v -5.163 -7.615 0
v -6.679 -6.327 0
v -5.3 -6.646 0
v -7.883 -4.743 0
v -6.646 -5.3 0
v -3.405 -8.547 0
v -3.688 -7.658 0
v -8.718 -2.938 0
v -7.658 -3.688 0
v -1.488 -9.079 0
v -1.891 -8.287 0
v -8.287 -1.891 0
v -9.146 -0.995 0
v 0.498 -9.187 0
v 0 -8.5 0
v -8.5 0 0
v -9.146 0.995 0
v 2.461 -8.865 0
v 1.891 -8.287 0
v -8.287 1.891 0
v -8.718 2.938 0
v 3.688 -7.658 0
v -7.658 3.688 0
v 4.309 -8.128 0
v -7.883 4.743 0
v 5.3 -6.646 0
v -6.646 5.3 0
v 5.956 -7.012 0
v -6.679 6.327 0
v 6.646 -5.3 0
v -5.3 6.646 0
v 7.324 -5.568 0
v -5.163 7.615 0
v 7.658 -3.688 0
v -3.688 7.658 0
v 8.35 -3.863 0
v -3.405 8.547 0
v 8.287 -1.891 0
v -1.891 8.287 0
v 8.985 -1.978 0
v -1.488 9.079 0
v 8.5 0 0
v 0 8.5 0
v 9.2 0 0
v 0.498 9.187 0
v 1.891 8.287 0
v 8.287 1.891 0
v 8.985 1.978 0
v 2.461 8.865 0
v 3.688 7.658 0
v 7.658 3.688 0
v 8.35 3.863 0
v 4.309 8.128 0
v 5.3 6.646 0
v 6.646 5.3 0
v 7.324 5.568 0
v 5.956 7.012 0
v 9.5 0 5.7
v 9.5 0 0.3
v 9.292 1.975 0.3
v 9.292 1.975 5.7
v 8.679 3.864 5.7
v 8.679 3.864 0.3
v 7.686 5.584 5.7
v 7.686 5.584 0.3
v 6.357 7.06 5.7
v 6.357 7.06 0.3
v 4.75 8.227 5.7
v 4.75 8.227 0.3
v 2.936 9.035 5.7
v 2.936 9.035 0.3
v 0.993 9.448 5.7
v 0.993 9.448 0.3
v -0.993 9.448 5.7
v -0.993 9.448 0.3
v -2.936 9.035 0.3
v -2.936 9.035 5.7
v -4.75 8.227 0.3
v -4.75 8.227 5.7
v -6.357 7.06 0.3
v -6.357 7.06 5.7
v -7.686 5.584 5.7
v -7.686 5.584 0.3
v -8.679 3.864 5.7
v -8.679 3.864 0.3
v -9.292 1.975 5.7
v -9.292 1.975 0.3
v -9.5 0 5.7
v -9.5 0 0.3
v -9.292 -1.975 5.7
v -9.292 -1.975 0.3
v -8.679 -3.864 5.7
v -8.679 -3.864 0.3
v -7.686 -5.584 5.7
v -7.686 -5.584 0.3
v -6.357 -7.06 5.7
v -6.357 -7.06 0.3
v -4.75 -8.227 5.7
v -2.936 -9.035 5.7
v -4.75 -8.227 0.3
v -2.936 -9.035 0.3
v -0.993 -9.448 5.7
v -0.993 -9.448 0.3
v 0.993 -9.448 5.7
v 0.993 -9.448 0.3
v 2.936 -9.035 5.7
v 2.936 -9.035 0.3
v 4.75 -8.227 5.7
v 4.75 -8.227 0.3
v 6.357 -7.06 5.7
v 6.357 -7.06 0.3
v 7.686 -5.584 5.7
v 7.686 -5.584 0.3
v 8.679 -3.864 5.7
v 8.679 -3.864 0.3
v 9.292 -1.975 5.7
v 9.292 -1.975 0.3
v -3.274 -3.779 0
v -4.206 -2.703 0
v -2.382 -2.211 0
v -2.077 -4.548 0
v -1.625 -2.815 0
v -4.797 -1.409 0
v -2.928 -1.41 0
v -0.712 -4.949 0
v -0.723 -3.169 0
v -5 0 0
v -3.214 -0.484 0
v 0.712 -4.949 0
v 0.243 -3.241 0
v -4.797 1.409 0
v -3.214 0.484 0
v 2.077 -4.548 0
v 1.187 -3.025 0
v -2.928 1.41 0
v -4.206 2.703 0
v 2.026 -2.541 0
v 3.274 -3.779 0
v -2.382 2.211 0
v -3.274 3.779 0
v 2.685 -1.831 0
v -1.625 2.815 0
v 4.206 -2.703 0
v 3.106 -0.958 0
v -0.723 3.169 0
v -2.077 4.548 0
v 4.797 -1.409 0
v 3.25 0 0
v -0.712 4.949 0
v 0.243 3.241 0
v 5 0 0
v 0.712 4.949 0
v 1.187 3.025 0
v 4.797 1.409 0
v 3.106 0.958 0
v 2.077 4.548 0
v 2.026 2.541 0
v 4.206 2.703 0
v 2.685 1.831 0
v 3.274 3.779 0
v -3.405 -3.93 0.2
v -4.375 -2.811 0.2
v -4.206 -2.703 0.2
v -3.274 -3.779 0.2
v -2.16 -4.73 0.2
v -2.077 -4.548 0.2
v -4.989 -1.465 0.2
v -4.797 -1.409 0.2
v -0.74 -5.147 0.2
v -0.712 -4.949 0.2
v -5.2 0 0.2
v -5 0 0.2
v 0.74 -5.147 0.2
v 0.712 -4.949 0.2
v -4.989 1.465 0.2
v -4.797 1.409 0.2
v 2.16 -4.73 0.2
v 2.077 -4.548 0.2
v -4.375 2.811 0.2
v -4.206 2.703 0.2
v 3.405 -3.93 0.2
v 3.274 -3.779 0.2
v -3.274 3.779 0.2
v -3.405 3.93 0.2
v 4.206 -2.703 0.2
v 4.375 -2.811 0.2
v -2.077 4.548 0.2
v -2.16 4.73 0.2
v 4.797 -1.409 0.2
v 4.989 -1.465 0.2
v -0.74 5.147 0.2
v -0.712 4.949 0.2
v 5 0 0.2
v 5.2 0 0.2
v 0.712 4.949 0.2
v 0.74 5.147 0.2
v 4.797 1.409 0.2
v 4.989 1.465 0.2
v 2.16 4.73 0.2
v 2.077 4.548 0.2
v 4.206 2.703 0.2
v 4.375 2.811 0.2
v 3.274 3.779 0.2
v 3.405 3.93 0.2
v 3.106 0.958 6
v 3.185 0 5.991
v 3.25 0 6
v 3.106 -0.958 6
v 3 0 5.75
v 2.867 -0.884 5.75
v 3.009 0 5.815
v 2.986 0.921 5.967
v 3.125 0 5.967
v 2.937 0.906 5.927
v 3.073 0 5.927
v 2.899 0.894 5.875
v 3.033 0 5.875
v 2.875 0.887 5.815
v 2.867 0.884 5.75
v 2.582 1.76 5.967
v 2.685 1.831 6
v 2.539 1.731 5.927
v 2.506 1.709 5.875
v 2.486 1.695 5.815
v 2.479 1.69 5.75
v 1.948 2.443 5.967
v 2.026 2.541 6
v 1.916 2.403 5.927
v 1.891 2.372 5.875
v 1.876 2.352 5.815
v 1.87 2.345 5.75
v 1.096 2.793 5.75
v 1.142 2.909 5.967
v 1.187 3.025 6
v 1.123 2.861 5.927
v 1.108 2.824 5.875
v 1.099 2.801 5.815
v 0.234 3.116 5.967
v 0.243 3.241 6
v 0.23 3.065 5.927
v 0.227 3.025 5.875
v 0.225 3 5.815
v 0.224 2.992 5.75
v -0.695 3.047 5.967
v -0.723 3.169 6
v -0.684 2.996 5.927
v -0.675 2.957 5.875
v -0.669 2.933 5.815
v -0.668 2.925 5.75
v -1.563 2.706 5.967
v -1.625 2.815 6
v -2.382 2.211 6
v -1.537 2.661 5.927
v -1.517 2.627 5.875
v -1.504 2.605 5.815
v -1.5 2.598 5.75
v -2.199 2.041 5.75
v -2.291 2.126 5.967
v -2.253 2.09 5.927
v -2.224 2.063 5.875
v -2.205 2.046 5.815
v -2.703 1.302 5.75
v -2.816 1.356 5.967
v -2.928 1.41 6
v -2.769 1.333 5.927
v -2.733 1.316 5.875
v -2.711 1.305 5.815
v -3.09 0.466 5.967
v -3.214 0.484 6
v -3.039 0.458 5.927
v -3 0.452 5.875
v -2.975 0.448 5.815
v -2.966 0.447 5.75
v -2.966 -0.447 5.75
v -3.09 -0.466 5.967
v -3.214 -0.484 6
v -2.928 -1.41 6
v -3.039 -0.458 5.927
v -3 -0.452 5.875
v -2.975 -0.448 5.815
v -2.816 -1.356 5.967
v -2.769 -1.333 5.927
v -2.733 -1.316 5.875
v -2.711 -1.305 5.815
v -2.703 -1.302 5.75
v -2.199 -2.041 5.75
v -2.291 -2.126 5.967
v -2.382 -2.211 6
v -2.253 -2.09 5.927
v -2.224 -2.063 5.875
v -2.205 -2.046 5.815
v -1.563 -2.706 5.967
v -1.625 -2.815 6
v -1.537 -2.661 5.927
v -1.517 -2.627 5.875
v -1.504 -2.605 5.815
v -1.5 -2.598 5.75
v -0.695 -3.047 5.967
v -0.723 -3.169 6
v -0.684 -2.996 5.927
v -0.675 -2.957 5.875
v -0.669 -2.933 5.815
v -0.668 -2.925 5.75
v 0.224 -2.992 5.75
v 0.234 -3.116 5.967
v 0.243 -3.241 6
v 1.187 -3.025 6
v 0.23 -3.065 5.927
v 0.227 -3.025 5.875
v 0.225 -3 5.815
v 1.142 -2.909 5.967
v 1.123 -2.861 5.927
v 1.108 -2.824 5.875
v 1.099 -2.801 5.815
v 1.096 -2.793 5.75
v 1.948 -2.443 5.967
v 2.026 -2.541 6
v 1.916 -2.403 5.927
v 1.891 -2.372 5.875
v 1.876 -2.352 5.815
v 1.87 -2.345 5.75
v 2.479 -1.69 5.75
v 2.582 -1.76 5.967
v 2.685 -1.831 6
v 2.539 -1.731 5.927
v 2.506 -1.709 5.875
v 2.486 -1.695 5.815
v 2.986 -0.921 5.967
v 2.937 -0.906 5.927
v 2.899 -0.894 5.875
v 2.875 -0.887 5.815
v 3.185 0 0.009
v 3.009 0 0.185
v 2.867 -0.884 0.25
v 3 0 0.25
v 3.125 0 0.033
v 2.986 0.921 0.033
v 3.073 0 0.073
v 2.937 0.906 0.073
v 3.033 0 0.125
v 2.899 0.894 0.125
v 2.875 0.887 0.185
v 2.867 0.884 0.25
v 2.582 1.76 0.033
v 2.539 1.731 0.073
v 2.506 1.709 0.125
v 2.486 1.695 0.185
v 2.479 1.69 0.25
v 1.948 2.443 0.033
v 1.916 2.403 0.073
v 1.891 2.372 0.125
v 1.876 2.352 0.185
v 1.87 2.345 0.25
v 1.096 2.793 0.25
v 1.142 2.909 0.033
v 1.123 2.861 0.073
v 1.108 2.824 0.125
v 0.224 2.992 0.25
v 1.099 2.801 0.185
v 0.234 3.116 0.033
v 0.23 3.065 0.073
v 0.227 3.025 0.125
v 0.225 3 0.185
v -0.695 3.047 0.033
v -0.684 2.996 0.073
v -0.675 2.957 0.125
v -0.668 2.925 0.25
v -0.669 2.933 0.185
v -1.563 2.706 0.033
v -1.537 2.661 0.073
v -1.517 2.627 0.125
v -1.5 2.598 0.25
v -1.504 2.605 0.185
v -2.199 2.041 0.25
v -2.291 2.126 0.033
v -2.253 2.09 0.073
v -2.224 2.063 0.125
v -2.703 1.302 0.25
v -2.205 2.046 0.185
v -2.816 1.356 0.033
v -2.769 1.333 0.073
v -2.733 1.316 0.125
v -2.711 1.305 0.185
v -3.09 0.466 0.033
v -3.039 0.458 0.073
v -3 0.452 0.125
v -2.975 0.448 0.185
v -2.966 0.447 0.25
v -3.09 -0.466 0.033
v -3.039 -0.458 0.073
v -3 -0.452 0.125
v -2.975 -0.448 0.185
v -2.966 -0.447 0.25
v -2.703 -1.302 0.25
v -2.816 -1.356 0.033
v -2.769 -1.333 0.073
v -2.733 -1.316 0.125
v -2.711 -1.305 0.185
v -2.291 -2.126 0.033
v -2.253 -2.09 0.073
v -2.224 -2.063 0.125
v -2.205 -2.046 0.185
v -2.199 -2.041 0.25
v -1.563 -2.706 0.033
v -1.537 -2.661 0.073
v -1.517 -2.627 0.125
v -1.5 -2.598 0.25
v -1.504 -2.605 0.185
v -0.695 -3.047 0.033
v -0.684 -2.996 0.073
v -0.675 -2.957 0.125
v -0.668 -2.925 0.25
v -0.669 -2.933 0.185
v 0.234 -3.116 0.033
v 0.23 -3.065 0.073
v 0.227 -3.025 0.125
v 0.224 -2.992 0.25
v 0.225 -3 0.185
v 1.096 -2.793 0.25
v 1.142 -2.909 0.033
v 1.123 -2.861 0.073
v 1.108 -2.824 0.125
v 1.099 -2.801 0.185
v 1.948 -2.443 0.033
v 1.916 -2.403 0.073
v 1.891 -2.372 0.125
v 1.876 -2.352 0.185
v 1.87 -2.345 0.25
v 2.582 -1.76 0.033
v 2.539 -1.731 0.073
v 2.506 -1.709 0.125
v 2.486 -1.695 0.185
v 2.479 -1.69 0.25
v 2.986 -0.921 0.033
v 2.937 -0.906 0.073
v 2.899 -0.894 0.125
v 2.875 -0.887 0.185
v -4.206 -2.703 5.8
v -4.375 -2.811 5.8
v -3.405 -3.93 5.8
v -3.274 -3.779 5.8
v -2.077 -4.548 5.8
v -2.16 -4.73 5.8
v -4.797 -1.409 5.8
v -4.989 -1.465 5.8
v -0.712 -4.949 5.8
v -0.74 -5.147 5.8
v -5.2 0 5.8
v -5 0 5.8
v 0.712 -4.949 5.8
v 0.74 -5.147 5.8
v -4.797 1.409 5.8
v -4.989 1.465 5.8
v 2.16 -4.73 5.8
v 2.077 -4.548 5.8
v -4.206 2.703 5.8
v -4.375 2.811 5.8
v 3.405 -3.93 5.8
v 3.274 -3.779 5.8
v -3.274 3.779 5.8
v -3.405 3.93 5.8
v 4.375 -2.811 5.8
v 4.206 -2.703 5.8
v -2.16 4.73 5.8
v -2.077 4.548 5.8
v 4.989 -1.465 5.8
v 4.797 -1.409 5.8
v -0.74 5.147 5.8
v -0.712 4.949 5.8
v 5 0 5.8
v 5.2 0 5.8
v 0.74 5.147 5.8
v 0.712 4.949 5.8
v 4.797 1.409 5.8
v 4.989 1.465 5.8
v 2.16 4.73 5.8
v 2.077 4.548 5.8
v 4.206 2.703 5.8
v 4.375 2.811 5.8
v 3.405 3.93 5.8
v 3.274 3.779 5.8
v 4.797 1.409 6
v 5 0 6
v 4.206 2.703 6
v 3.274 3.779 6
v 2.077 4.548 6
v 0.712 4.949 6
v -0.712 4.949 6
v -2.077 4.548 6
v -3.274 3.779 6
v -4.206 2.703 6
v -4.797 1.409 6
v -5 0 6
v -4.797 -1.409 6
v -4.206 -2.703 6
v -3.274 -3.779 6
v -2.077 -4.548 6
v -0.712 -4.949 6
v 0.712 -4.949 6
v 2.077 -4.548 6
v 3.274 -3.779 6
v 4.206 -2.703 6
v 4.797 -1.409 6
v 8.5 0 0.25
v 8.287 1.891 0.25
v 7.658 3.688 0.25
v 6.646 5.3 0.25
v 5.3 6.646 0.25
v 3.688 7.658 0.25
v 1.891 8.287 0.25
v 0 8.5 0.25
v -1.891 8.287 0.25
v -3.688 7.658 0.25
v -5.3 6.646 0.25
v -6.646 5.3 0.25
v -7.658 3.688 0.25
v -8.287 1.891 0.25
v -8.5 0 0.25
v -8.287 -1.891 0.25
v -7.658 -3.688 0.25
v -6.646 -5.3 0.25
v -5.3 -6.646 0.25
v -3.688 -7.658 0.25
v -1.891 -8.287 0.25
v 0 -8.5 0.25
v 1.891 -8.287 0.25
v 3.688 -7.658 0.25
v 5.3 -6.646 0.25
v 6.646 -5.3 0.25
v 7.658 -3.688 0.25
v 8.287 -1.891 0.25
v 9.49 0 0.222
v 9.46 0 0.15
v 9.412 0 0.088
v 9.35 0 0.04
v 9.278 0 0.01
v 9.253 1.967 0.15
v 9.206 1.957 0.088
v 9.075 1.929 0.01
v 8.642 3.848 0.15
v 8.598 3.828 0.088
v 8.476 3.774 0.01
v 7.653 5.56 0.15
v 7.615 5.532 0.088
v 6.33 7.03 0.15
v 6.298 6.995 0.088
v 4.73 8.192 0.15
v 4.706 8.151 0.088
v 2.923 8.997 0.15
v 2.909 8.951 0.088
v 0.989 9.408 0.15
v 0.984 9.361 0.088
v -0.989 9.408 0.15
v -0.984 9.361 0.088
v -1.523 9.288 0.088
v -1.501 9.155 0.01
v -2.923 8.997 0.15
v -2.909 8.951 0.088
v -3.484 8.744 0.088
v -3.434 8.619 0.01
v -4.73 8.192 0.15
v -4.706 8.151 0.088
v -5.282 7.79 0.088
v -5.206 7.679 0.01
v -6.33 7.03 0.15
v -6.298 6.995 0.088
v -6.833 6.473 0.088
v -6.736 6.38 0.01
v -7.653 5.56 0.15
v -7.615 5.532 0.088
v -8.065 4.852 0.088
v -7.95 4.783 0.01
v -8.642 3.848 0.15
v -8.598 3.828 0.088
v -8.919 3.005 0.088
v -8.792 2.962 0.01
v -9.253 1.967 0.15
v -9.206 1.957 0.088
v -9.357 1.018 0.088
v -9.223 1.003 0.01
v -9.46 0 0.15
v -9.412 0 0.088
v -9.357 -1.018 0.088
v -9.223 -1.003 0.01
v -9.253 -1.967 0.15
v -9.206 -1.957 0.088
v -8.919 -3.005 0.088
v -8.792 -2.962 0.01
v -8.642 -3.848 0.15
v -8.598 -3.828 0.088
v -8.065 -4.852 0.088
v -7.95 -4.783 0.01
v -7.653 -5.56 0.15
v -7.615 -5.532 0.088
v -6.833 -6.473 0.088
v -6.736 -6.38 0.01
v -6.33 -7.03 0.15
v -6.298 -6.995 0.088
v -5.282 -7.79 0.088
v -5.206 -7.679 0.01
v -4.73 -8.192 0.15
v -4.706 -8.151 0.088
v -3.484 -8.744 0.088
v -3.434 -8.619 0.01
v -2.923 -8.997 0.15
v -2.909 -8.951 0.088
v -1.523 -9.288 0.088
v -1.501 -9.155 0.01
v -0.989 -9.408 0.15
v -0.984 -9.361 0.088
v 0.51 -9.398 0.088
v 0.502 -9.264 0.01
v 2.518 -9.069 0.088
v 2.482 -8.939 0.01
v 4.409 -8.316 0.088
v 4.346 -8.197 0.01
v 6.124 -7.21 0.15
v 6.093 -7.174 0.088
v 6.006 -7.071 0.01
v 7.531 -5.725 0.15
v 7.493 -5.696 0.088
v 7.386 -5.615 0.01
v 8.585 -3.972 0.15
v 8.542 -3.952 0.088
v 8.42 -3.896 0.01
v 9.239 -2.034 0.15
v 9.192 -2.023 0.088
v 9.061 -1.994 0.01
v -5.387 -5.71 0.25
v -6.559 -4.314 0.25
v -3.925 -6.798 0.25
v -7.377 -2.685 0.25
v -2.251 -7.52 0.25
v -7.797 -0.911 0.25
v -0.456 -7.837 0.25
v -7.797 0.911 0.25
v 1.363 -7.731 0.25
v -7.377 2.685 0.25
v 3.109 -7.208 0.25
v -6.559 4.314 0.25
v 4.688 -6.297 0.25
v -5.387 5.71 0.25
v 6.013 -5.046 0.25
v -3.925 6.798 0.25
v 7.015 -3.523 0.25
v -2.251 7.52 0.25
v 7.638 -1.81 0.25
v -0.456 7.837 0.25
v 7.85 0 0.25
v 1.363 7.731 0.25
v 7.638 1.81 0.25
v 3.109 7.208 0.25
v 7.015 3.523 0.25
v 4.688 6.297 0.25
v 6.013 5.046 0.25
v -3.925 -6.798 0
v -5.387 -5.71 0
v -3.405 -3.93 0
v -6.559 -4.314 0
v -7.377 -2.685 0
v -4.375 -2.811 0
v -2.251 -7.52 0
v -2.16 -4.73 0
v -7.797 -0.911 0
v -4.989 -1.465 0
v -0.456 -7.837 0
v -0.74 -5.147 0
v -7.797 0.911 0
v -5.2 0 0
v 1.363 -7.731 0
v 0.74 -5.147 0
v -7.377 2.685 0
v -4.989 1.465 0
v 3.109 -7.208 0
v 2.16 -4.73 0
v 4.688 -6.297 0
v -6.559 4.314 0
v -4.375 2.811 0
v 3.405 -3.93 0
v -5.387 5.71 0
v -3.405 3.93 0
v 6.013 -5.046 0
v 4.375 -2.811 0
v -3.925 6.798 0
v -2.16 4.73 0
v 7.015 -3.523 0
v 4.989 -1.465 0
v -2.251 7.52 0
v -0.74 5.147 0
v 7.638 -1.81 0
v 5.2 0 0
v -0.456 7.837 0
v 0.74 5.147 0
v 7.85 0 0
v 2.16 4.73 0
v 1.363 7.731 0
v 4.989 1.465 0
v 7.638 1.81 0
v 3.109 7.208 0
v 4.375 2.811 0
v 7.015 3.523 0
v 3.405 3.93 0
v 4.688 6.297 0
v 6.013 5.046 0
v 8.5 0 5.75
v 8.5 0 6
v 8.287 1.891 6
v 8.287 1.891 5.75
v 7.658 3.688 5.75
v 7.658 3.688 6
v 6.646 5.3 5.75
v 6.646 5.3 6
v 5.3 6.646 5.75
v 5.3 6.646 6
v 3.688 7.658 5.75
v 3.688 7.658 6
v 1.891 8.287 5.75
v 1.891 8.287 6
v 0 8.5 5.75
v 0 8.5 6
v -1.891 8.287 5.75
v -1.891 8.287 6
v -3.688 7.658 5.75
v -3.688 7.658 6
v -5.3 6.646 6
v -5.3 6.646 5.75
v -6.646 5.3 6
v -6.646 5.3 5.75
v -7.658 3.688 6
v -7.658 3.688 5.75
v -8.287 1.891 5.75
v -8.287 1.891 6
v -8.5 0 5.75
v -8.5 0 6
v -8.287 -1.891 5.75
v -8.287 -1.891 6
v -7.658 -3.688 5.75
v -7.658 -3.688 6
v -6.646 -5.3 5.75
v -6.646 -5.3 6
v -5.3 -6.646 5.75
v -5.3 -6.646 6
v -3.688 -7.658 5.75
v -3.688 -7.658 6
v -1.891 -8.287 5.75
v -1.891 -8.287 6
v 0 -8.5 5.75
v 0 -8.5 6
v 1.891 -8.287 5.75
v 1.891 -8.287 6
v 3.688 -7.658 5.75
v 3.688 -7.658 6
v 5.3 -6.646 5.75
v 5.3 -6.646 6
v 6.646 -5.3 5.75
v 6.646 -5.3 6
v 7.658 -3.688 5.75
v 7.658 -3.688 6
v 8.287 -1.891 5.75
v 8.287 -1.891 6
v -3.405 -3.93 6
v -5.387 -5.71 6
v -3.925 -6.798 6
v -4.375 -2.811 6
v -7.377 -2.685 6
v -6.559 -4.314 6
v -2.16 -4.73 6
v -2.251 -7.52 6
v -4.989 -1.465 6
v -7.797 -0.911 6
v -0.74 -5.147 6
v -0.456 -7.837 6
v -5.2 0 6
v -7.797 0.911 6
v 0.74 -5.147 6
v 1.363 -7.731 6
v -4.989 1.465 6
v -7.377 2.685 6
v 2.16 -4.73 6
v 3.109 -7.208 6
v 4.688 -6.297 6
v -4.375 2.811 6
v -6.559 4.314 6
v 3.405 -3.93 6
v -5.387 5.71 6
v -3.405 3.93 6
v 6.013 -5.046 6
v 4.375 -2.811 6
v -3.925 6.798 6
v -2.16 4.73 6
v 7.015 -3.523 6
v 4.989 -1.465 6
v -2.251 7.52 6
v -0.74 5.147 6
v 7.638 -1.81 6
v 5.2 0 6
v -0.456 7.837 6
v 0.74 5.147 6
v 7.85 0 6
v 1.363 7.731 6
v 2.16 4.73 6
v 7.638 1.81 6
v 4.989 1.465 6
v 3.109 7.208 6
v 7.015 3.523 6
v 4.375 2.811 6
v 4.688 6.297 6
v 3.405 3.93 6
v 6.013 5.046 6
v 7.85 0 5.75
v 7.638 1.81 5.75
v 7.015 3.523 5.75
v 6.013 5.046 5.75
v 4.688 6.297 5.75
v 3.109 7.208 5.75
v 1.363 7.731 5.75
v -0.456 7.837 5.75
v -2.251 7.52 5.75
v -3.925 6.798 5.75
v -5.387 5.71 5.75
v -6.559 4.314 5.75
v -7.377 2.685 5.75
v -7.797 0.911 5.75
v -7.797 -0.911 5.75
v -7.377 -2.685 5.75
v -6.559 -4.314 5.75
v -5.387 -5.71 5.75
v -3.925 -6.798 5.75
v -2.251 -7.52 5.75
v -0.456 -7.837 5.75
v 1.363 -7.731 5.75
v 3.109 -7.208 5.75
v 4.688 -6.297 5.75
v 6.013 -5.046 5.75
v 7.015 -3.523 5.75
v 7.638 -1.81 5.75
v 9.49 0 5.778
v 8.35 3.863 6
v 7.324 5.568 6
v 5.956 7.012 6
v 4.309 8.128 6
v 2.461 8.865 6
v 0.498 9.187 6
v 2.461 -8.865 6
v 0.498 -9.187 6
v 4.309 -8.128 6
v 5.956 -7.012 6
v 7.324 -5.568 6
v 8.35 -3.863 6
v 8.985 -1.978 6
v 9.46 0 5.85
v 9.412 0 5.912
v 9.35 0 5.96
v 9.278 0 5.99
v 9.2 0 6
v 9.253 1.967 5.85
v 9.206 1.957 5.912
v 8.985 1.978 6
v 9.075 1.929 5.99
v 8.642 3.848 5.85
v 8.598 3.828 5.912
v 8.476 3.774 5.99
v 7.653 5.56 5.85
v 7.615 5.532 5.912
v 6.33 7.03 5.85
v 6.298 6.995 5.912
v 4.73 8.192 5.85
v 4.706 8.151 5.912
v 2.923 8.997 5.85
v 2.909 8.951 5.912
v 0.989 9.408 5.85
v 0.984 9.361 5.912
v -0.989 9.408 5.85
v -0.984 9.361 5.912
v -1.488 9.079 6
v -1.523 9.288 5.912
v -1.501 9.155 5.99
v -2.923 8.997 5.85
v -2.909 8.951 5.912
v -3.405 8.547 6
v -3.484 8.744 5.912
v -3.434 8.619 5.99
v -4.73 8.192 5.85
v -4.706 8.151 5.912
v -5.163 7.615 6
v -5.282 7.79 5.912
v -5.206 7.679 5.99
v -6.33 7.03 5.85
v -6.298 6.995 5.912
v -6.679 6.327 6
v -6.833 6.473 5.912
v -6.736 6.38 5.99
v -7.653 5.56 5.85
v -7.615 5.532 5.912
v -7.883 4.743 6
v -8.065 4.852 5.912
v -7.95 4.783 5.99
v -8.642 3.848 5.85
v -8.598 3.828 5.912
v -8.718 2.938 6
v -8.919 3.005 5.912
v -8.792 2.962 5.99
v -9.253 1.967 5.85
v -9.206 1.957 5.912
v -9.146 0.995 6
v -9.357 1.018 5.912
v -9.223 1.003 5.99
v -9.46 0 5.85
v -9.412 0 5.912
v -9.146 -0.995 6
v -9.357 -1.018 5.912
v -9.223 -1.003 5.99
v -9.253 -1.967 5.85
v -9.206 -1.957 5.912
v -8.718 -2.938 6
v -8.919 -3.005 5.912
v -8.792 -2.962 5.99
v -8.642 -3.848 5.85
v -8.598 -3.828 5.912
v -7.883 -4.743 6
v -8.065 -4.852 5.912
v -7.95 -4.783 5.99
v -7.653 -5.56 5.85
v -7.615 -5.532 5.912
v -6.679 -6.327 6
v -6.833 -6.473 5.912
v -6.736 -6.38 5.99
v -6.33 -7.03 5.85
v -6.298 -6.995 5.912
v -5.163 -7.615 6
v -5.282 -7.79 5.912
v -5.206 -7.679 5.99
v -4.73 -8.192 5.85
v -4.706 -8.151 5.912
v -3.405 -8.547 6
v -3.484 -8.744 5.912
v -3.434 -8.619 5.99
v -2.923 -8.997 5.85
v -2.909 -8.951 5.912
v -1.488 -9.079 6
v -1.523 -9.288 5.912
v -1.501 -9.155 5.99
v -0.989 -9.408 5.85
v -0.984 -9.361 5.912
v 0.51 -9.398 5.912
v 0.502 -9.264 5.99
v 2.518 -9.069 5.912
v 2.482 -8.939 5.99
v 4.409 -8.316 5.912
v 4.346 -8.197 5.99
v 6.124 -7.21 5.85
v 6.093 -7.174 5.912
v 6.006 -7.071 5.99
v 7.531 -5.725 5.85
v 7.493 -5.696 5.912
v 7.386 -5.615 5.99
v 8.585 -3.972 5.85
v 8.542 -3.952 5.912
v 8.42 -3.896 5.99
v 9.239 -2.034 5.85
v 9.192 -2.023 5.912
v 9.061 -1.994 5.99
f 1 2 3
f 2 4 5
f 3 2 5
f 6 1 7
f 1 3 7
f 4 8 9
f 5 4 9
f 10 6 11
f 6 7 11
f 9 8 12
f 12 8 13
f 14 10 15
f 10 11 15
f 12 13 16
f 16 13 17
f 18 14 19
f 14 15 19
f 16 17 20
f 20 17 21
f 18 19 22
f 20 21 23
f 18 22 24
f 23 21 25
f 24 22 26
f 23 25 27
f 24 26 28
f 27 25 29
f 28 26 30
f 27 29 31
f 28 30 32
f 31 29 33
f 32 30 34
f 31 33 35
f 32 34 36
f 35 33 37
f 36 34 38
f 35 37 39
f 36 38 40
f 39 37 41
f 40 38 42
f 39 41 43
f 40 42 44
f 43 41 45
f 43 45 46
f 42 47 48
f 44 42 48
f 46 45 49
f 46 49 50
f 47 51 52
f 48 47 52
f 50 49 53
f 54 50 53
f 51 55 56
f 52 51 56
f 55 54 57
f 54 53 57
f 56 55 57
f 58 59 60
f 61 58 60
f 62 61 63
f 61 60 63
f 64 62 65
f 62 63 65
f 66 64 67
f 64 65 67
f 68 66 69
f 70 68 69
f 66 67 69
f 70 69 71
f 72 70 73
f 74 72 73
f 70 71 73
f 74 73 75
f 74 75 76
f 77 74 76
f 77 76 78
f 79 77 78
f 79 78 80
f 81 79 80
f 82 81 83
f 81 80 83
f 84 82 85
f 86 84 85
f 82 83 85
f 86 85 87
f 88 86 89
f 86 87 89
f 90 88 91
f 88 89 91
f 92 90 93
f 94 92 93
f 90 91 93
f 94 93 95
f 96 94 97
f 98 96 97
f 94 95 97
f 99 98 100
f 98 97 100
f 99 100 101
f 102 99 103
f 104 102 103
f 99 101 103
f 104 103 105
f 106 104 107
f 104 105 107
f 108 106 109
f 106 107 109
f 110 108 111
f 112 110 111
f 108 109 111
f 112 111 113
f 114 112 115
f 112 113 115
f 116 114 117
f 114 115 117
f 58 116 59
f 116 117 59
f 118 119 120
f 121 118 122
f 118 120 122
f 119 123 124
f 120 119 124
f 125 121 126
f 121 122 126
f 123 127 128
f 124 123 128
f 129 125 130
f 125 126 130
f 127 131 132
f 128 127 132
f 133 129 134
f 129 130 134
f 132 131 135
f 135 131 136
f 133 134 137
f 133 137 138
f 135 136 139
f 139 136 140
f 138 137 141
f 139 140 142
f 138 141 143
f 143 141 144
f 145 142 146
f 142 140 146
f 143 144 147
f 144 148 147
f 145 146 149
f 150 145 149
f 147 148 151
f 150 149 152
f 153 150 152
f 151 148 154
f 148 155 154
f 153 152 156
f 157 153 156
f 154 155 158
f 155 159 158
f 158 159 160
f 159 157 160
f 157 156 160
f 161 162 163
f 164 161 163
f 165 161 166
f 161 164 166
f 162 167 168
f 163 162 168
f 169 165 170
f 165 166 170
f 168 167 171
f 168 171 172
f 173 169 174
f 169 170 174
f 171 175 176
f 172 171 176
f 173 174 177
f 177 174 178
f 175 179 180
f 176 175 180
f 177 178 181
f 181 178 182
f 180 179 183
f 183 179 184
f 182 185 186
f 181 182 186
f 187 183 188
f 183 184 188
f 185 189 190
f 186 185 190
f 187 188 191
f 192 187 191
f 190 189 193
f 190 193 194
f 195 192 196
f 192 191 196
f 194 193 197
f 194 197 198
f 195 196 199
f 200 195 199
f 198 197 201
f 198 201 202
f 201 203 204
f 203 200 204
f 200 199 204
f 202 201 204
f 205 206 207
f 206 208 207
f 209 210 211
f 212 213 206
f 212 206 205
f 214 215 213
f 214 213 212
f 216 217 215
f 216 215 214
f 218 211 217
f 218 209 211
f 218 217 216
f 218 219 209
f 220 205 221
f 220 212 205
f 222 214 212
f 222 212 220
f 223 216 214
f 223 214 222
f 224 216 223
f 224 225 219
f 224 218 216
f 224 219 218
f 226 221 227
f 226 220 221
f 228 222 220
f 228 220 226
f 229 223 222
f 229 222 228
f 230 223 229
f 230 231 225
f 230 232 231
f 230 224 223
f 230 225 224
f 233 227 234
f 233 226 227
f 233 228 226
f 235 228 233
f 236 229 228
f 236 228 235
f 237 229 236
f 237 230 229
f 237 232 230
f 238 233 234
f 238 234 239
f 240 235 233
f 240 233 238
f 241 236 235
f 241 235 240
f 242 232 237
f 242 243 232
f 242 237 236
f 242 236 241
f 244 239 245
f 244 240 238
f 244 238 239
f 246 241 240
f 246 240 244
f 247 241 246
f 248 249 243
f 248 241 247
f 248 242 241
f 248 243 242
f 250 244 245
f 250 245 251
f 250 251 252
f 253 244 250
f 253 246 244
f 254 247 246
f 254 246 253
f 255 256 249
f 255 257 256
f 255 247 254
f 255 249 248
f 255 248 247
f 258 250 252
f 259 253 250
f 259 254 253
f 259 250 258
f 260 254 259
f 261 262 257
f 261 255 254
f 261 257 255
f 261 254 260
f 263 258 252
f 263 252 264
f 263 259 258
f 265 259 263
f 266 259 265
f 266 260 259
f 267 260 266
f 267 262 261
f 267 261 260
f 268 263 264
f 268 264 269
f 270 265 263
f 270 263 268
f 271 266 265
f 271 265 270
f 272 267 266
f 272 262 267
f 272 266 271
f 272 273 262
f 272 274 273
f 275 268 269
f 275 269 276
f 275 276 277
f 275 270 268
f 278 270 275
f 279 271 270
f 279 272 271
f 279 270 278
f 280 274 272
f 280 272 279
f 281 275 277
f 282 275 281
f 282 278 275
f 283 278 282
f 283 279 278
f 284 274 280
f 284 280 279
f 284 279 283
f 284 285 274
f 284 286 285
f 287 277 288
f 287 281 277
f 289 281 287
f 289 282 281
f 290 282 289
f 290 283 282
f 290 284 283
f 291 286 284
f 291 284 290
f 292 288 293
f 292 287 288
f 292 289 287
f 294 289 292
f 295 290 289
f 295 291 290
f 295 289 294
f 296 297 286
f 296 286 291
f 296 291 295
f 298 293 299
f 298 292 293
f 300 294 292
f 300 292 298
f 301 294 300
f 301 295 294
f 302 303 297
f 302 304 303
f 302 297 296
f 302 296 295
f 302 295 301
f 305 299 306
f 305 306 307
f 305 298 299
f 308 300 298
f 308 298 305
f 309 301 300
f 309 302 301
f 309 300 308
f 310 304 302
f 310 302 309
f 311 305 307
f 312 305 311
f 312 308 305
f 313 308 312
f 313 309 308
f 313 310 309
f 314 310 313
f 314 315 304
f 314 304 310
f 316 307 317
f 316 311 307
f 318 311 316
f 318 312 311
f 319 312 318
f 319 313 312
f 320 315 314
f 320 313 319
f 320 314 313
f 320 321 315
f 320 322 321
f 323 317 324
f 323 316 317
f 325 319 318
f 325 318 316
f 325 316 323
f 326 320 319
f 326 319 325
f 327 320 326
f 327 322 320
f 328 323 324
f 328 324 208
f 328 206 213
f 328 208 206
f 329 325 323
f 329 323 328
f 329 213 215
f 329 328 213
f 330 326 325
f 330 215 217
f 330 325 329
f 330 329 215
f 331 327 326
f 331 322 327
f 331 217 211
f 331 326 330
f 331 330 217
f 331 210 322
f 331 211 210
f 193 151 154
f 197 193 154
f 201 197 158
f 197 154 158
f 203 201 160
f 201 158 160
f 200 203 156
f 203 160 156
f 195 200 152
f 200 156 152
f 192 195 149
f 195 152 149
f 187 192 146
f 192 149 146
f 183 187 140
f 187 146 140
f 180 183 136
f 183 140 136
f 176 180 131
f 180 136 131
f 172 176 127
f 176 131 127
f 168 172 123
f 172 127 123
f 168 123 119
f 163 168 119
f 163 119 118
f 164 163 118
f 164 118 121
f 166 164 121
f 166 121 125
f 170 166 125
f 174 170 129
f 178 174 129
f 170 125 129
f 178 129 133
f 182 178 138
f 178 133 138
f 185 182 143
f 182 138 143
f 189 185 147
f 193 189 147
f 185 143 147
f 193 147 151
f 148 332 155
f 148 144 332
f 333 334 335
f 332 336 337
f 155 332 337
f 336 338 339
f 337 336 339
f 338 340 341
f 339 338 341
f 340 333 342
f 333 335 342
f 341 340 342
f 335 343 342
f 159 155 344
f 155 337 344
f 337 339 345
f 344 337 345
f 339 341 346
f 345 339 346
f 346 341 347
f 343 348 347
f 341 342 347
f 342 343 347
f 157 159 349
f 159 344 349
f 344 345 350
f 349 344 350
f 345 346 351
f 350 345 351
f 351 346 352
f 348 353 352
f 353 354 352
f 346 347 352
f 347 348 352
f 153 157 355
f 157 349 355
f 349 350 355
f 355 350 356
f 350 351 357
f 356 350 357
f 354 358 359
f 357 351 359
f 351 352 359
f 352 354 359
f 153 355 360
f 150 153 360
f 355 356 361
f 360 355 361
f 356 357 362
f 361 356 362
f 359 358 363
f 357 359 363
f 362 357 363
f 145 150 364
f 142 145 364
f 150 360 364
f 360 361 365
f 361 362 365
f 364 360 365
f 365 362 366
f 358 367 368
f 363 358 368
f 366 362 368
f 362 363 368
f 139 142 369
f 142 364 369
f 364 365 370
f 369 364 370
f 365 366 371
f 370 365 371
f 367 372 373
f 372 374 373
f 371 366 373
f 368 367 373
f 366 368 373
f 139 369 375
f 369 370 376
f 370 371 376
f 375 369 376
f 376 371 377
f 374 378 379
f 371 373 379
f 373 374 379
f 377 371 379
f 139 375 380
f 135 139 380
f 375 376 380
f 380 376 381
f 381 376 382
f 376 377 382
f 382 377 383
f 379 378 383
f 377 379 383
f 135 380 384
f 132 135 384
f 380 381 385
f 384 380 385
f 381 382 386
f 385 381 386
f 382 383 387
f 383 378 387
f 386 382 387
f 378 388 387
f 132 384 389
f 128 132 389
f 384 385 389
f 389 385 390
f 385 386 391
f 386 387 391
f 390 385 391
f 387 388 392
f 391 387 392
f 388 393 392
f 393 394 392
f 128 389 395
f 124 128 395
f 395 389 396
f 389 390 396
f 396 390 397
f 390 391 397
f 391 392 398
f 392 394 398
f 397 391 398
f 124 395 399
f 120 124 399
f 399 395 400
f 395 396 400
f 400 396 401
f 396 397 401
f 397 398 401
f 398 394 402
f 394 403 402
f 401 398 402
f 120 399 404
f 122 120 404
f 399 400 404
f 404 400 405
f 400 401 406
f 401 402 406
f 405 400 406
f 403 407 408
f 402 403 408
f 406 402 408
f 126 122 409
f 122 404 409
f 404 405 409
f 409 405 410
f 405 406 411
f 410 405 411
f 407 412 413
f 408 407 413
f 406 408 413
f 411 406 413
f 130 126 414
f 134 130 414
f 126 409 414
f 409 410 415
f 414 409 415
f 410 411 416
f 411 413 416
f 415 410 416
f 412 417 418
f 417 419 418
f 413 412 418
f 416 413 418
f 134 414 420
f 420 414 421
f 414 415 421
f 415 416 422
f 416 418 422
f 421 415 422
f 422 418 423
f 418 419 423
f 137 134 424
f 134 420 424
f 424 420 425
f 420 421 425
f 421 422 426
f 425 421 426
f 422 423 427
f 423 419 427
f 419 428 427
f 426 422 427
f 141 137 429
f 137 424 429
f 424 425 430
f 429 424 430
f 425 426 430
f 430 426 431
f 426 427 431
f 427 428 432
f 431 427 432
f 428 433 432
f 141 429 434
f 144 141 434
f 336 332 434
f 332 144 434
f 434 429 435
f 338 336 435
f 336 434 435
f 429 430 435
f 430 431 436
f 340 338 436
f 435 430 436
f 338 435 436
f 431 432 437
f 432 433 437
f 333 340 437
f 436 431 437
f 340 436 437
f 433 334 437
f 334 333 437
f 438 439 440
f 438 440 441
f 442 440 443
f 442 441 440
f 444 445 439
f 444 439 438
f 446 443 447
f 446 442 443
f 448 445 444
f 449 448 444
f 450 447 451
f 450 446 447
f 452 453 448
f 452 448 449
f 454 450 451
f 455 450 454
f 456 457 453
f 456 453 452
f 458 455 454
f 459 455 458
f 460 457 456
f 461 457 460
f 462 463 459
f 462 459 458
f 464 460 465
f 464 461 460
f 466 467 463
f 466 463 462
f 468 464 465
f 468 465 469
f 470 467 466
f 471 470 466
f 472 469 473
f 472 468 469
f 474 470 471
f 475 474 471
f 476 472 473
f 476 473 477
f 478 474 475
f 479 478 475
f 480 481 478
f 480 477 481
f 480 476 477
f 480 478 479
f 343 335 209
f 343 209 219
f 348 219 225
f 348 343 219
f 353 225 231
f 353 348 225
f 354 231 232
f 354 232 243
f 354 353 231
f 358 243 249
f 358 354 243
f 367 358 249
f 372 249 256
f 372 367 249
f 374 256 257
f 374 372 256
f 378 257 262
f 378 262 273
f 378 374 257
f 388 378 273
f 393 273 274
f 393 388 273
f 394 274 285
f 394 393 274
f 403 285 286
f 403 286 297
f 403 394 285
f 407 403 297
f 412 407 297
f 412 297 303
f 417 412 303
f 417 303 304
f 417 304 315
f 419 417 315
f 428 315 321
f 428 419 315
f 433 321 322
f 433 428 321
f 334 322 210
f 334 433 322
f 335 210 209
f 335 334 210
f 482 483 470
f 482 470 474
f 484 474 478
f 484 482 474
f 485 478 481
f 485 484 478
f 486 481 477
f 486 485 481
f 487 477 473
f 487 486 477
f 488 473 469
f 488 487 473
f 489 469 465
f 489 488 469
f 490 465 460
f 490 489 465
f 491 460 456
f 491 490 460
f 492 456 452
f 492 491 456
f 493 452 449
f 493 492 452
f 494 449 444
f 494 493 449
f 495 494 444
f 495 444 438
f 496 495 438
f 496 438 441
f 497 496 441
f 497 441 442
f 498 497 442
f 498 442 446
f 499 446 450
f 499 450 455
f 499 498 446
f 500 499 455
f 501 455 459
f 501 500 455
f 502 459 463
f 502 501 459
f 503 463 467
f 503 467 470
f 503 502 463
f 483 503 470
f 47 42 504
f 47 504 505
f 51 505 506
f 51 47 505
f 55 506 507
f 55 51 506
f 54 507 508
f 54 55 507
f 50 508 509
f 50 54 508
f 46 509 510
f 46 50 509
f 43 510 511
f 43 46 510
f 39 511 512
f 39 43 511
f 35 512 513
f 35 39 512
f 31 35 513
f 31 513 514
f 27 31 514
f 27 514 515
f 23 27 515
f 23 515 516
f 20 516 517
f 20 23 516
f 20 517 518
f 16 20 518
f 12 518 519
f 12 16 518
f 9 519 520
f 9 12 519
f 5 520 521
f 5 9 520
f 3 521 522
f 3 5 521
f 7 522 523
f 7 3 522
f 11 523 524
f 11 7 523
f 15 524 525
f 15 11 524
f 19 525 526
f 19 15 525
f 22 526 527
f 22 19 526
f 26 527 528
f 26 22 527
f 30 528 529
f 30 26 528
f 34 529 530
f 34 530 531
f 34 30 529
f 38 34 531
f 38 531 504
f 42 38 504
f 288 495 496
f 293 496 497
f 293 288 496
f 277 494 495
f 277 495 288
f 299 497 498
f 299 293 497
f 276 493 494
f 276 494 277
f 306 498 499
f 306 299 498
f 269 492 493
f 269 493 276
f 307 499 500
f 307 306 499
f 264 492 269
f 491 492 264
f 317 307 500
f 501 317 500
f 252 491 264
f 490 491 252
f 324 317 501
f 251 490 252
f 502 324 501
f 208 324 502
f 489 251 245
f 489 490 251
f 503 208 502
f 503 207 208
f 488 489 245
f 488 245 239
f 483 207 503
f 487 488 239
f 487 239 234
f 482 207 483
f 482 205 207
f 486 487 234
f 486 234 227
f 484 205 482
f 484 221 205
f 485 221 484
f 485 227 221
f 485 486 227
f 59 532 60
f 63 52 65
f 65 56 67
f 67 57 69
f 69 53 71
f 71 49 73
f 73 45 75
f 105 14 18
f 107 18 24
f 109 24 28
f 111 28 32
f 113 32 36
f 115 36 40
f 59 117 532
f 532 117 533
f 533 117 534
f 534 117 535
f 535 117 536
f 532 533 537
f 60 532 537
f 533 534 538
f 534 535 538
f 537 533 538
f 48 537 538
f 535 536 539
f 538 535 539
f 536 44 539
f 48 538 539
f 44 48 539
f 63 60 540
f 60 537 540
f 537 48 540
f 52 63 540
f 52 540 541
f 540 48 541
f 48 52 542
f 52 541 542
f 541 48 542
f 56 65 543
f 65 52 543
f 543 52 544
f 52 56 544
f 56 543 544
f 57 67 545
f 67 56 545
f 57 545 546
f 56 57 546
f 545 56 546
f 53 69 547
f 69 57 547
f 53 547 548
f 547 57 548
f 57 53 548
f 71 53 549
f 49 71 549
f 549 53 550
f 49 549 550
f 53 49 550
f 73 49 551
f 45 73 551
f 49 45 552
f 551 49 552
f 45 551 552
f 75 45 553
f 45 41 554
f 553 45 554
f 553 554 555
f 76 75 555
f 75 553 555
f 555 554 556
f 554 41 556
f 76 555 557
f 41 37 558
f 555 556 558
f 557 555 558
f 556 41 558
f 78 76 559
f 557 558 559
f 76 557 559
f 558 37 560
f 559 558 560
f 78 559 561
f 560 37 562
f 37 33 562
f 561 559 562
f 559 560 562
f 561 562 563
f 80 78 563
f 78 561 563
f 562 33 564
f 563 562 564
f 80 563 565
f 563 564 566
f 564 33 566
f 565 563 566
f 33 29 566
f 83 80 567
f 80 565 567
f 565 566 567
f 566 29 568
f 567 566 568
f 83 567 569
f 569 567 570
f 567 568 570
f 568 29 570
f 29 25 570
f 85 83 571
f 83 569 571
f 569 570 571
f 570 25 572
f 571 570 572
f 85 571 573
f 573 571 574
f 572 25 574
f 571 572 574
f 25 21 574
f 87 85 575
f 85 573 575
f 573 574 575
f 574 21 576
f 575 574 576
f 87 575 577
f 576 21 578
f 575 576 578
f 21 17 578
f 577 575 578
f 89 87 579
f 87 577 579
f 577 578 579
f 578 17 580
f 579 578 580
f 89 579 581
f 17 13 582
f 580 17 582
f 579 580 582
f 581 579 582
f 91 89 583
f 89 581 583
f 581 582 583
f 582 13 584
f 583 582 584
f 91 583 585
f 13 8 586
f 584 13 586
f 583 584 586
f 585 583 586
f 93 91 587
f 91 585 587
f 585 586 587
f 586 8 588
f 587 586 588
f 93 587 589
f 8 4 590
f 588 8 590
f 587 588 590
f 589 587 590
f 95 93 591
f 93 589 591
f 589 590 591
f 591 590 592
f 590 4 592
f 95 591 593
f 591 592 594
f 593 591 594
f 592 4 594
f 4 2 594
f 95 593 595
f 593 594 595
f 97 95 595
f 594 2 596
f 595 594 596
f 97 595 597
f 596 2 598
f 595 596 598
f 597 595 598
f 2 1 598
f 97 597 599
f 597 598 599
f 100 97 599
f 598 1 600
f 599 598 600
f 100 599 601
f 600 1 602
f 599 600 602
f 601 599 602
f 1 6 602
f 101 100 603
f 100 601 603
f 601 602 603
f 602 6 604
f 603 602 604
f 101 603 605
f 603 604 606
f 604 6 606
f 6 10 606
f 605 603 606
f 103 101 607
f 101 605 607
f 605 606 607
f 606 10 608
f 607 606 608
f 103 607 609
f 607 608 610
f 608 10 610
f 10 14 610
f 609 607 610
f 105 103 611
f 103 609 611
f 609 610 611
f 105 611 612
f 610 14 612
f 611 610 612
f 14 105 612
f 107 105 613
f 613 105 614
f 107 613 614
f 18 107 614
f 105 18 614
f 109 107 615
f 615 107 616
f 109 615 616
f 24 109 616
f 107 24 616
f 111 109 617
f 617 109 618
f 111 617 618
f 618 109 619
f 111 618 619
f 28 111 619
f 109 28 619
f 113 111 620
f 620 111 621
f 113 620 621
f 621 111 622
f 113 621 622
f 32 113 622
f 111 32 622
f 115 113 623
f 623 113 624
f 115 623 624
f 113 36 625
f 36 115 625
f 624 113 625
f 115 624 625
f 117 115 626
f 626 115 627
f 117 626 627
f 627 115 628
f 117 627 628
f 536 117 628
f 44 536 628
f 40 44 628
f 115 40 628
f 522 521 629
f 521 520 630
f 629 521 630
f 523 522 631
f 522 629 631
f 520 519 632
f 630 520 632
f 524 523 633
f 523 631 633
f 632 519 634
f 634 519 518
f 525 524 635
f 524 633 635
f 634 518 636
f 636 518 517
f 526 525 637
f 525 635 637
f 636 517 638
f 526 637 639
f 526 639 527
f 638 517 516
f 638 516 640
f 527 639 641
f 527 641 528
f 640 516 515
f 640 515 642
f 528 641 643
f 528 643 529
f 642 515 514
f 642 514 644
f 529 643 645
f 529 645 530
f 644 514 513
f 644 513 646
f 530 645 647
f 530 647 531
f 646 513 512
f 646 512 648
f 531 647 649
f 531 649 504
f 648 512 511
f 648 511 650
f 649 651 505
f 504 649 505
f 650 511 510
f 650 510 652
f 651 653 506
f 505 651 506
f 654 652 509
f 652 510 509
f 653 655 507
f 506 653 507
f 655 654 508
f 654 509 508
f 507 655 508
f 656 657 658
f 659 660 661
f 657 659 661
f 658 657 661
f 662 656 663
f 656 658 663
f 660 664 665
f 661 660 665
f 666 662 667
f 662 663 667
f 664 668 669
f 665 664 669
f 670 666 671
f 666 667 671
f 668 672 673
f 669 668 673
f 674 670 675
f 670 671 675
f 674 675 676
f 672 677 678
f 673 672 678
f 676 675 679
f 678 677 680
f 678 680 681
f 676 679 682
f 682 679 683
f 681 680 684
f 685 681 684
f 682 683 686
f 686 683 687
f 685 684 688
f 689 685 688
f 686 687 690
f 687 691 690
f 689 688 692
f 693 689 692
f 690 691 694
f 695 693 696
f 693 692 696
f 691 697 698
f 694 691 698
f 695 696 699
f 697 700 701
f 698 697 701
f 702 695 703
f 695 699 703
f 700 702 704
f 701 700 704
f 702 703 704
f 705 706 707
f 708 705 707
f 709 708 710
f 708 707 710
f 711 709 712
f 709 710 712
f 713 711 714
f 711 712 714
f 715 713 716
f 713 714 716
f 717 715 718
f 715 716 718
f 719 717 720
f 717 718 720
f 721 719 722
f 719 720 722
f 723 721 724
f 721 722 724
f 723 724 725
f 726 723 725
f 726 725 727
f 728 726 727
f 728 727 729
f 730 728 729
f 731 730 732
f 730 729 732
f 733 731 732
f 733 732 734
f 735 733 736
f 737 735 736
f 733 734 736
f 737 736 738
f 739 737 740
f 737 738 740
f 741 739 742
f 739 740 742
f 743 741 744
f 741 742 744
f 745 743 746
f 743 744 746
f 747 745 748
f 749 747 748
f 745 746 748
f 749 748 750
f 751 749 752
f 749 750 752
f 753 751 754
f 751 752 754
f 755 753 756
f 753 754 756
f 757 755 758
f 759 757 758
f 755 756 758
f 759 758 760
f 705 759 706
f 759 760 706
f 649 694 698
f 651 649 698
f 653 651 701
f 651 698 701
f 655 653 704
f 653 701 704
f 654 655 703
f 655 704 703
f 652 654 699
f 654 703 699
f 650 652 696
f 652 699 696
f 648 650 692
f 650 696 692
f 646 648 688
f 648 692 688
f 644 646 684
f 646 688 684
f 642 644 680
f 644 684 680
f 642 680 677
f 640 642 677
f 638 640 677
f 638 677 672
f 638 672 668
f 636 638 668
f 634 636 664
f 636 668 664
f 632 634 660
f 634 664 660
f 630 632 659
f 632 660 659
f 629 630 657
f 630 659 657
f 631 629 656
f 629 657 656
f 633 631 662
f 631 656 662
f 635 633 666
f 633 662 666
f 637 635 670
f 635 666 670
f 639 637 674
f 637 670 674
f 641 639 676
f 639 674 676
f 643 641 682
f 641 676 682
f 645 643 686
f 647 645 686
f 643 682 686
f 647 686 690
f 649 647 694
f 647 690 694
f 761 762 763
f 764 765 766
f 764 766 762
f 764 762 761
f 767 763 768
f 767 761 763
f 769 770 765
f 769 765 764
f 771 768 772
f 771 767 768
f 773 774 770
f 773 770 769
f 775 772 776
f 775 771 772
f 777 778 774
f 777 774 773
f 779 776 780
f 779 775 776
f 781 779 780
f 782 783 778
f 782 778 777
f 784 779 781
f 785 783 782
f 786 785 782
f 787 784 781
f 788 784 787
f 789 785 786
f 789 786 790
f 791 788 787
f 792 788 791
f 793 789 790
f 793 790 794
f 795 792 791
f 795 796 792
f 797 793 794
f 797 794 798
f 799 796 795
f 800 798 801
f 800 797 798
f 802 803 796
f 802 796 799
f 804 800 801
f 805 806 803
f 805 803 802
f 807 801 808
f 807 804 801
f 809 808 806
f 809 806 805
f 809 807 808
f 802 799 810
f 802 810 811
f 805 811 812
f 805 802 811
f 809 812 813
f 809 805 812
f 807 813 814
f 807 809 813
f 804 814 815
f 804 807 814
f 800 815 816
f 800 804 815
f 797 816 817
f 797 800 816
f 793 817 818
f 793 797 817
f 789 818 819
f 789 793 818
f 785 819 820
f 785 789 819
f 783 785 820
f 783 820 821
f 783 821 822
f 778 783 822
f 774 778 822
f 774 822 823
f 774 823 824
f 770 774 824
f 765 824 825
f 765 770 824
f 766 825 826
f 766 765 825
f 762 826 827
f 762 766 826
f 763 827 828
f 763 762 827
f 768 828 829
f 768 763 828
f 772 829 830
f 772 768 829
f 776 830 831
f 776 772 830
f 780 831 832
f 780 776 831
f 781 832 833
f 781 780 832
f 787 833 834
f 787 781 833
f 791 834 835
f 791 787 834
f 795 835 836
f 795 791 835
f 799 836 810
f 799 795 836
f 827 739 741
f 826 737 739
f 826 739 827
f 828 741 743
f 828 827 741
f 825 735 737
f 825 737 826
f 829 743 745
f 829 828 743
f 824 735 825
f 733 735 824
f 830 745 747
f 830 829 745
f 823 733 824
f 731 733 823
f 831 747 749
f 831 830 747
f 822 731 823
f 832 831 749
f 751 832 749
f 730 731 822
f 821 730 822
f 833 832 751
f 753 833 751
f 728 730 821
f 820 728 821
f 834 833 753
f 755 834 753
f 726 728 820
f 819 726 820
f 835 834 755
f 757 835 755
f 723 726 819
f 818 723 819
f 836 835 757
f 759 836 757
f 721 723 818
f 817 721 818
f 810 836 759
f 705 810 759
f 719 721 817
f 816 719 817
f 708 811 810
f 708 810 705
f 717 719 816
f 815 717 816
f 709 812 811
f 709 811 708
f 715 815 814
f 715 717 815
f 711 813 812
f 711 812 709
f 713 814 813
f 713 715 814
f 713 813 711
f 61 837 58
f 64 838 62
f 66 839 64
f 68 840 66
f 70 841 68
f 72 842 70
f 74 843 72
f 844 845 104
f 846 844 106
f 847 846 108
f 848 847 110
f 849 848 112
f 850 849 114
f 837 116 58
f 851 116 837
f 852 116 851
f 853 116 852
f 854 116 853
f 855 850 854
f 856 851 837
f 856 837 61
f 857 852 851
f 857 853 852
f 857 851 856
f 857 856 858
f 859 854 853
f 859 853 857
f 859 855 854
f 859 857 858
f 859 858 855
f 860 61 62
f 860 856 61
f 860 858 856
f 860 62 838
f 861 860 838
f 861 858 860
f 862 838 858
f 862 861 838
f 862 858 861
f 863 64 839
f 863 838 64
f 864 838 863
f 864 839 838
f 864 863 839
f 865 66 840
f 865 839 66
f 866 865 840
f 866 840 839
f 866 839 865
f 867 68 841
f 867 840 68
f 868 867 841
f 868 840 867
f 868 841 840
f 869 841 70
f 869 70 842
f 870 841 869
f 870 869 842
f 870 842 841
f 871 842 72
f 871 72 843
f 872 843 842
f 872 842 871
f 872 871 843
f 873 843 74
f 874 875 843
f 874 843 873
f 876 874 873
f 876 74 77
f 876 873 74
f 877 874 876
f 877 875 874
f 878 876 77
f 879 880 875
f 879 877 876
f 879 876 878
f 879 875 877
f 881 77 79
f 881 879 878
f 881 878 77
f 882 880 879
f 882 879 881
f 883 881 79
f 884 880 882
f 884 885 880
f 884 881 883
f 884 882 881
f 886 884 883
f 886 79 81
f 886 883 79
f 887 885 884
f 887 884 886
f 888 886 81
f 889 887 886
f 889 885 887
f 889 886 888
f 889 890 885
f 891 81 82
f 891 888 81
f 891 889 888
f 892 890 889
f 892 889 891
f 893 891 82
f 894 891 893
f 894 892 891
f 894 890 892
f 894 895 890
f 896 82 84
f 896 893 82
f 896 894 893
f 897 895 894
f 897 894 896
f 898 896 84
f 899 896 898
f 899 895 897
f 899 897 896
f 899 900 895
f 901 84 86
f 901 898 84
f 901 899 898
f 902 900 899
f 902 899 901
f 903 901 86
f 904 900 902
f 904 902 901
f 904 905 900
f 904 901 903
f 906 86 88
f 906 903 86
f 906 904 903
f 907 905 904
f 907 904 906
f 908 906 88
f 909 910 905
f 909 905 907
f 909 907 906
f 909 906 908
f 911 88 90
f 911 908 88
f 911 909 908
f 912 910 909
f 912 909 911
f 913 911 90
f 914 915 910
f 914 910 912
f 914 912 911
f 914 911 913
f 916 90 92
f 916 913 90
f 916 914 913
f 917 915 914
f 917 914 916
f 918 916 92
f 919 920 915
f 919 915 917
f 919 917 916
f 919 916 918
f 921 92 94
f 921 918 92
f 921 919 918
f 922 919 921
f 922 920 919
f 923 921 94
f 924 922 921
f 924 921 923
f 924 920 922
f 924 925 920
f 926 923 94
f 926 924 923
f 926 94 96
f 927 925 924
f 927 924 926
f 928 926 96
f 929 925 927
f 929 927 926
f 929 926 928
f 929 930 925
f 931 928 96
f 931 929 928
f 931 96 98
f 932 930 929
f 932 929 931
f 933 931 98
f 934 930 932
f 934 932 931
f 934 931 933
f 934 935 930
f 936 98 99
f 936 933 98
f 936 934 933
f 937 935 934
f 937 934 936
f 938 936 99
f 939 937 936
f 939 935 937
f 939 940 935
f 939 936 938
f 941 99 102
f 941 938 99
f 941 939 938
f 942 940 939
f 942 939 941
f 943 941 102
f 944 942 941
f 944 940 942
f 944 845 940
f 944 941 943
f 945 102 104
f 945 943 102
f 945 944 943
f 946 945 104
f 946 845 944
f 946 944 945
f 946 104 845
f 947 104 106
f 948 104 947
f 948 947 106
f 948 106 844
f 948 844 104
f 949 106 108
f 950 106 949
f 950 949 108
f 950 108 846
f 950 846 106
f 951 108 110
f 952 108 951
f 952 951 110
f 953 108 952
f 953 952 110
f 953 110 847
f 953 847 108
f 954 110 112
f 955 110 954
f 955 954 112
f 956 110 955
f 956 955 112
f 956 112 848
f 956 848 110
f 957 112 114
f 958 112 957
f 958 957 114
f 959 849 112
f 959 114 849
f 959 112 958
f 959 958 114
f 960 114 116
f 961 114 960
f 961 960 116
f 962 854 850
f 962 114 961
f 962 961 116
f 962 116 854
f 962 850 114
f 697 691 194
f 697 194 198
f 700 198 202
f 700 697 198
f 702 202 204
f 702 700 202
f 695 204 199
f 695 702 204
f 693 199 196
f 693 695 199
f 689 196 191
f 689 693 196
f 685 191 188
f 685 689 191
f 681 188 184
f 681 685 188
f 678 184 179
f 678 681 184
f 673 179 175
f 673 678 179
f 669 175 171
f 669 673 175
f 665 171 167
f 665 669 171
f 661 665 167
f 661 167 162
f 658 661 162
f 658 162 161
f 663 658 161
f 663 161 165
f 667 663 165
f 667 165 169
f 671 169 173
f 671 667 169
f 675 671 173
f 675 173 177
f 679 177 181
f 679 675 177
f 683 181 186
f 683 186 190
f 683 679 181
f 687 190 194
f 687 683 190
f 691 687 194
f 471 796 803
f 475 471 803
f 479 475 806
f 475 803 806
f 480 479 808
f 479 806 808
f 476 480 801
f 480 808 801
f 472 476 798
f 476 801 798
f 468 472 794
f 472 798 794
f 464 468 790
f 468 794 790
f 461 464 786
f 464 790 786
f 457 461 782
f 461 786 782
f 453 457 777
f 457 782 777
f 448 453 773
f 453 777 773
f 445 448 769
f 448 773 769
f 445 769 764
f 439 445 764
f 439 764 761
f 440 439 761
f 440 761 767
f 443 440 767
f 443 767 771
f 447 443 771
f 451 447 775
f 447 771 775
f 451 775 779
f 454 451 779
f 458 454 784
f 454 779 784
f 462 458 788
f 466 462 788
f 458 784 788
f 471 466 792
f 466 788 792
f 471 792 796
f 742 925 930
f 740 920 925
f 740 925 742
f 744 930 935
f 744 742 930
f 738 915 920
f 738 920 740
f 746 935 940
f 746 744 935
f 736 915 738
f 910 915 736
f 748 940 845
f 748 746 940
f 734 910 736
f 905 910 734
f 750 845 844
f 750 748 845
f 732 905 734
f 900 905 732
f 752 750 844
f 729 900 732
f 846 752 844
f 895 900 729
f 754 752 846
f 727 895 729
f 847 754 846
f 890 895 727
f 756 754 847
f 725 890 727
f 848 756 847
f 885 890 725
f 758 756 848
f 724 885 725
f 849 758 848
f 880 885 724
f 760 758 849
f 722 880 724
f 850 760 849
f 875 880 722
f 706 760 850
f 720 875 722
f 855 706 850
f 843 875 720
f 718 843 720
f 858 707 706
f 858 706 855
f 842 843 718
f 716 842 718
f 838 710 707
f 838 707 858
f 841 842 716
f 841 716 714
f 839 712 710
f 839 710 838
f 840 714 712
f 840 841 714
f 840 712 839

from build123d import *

# Parameters (mm, degrees)
SKETCH1_R           = 9.5
SKETCH1_R_2         = 3
BOSS_EXTRUDE1_DEPTH = 6
SKETCH2_R           = 5.2
SKETCH2_R_2         = 5
CUT_EXTRUDE1_DEPTH  = 0.2
SKETCH3_R           = 8.5
SKETCH3_R_2         = 7.85
CUT_EXTRUDE2_DEPTH  = 0.25
FILLET1_R           = 0.3
FILLET2_R           = 0.25


with BuildPart() as part:
    # Sketch1 → Boss-Extrude1 (new body)
    with BuildSketch(Plane.XY):
        Circle(SKETCH1_R)
        Circle(SKETCH1_R_2, mode=Mode.SUBTRACT)
    extrude(amount=BOSS_EXTRUDE1_DEPTH)

    # Sketch2 → Cut-Extrude1 (cut)
    with BuildSketch(Plane.XY.offset(6)):
        Circle(SKETCH2_R)
        Circle(SKETCH2_R_2, mode=Mode.SUBTRACT)
    cut_extrude1 = extrude(amount=-CUT_EXTRUDE1_DEPTH, mode=Mode.SUBTRACT)

    # Sketch3 → Cut-Extrude2 (cut)
    with BuildSketch(Plane.XY.offset(6)):
        Circle(SKETCH3_R)
        Circle(SKETCH3_R_2, mode=Mode.SUBTRACT)
    cut_extrude2 = extrude(amount=-CUT_EXTRUDE2_DEPTH, mode=Mode.SUBTRACT)

    # Mirror1: Cut-Extrude1, Cut-Extrude2 across plane
    add(cut_extrude1.mirror(Plane.XY.offset(3)), mode=Mode.SUBTRACT)
    add(cut_extrude2.mirror(Plane.XY.offset(3)), mode=Mode.SUBTRACT)

    # Fillet1
    fillet1_edges = [part.edges().sort_by_distance(p)[0] for p in [
        (-9.5, 0, 0),
        (-9.5, 0, 6),
    ]]
    fillet(fillet1_edges, radius=FILLET1_R)

    # Fillet2
    fillet2_edges = [part.edges().sort_by_distance(p)[0] for p in [
        (-3, 0, 0),
        (-3, 0, 6),
    ]]
    fillet(fillet2_edges, radius=FILLET2_R)


solid = part.part
